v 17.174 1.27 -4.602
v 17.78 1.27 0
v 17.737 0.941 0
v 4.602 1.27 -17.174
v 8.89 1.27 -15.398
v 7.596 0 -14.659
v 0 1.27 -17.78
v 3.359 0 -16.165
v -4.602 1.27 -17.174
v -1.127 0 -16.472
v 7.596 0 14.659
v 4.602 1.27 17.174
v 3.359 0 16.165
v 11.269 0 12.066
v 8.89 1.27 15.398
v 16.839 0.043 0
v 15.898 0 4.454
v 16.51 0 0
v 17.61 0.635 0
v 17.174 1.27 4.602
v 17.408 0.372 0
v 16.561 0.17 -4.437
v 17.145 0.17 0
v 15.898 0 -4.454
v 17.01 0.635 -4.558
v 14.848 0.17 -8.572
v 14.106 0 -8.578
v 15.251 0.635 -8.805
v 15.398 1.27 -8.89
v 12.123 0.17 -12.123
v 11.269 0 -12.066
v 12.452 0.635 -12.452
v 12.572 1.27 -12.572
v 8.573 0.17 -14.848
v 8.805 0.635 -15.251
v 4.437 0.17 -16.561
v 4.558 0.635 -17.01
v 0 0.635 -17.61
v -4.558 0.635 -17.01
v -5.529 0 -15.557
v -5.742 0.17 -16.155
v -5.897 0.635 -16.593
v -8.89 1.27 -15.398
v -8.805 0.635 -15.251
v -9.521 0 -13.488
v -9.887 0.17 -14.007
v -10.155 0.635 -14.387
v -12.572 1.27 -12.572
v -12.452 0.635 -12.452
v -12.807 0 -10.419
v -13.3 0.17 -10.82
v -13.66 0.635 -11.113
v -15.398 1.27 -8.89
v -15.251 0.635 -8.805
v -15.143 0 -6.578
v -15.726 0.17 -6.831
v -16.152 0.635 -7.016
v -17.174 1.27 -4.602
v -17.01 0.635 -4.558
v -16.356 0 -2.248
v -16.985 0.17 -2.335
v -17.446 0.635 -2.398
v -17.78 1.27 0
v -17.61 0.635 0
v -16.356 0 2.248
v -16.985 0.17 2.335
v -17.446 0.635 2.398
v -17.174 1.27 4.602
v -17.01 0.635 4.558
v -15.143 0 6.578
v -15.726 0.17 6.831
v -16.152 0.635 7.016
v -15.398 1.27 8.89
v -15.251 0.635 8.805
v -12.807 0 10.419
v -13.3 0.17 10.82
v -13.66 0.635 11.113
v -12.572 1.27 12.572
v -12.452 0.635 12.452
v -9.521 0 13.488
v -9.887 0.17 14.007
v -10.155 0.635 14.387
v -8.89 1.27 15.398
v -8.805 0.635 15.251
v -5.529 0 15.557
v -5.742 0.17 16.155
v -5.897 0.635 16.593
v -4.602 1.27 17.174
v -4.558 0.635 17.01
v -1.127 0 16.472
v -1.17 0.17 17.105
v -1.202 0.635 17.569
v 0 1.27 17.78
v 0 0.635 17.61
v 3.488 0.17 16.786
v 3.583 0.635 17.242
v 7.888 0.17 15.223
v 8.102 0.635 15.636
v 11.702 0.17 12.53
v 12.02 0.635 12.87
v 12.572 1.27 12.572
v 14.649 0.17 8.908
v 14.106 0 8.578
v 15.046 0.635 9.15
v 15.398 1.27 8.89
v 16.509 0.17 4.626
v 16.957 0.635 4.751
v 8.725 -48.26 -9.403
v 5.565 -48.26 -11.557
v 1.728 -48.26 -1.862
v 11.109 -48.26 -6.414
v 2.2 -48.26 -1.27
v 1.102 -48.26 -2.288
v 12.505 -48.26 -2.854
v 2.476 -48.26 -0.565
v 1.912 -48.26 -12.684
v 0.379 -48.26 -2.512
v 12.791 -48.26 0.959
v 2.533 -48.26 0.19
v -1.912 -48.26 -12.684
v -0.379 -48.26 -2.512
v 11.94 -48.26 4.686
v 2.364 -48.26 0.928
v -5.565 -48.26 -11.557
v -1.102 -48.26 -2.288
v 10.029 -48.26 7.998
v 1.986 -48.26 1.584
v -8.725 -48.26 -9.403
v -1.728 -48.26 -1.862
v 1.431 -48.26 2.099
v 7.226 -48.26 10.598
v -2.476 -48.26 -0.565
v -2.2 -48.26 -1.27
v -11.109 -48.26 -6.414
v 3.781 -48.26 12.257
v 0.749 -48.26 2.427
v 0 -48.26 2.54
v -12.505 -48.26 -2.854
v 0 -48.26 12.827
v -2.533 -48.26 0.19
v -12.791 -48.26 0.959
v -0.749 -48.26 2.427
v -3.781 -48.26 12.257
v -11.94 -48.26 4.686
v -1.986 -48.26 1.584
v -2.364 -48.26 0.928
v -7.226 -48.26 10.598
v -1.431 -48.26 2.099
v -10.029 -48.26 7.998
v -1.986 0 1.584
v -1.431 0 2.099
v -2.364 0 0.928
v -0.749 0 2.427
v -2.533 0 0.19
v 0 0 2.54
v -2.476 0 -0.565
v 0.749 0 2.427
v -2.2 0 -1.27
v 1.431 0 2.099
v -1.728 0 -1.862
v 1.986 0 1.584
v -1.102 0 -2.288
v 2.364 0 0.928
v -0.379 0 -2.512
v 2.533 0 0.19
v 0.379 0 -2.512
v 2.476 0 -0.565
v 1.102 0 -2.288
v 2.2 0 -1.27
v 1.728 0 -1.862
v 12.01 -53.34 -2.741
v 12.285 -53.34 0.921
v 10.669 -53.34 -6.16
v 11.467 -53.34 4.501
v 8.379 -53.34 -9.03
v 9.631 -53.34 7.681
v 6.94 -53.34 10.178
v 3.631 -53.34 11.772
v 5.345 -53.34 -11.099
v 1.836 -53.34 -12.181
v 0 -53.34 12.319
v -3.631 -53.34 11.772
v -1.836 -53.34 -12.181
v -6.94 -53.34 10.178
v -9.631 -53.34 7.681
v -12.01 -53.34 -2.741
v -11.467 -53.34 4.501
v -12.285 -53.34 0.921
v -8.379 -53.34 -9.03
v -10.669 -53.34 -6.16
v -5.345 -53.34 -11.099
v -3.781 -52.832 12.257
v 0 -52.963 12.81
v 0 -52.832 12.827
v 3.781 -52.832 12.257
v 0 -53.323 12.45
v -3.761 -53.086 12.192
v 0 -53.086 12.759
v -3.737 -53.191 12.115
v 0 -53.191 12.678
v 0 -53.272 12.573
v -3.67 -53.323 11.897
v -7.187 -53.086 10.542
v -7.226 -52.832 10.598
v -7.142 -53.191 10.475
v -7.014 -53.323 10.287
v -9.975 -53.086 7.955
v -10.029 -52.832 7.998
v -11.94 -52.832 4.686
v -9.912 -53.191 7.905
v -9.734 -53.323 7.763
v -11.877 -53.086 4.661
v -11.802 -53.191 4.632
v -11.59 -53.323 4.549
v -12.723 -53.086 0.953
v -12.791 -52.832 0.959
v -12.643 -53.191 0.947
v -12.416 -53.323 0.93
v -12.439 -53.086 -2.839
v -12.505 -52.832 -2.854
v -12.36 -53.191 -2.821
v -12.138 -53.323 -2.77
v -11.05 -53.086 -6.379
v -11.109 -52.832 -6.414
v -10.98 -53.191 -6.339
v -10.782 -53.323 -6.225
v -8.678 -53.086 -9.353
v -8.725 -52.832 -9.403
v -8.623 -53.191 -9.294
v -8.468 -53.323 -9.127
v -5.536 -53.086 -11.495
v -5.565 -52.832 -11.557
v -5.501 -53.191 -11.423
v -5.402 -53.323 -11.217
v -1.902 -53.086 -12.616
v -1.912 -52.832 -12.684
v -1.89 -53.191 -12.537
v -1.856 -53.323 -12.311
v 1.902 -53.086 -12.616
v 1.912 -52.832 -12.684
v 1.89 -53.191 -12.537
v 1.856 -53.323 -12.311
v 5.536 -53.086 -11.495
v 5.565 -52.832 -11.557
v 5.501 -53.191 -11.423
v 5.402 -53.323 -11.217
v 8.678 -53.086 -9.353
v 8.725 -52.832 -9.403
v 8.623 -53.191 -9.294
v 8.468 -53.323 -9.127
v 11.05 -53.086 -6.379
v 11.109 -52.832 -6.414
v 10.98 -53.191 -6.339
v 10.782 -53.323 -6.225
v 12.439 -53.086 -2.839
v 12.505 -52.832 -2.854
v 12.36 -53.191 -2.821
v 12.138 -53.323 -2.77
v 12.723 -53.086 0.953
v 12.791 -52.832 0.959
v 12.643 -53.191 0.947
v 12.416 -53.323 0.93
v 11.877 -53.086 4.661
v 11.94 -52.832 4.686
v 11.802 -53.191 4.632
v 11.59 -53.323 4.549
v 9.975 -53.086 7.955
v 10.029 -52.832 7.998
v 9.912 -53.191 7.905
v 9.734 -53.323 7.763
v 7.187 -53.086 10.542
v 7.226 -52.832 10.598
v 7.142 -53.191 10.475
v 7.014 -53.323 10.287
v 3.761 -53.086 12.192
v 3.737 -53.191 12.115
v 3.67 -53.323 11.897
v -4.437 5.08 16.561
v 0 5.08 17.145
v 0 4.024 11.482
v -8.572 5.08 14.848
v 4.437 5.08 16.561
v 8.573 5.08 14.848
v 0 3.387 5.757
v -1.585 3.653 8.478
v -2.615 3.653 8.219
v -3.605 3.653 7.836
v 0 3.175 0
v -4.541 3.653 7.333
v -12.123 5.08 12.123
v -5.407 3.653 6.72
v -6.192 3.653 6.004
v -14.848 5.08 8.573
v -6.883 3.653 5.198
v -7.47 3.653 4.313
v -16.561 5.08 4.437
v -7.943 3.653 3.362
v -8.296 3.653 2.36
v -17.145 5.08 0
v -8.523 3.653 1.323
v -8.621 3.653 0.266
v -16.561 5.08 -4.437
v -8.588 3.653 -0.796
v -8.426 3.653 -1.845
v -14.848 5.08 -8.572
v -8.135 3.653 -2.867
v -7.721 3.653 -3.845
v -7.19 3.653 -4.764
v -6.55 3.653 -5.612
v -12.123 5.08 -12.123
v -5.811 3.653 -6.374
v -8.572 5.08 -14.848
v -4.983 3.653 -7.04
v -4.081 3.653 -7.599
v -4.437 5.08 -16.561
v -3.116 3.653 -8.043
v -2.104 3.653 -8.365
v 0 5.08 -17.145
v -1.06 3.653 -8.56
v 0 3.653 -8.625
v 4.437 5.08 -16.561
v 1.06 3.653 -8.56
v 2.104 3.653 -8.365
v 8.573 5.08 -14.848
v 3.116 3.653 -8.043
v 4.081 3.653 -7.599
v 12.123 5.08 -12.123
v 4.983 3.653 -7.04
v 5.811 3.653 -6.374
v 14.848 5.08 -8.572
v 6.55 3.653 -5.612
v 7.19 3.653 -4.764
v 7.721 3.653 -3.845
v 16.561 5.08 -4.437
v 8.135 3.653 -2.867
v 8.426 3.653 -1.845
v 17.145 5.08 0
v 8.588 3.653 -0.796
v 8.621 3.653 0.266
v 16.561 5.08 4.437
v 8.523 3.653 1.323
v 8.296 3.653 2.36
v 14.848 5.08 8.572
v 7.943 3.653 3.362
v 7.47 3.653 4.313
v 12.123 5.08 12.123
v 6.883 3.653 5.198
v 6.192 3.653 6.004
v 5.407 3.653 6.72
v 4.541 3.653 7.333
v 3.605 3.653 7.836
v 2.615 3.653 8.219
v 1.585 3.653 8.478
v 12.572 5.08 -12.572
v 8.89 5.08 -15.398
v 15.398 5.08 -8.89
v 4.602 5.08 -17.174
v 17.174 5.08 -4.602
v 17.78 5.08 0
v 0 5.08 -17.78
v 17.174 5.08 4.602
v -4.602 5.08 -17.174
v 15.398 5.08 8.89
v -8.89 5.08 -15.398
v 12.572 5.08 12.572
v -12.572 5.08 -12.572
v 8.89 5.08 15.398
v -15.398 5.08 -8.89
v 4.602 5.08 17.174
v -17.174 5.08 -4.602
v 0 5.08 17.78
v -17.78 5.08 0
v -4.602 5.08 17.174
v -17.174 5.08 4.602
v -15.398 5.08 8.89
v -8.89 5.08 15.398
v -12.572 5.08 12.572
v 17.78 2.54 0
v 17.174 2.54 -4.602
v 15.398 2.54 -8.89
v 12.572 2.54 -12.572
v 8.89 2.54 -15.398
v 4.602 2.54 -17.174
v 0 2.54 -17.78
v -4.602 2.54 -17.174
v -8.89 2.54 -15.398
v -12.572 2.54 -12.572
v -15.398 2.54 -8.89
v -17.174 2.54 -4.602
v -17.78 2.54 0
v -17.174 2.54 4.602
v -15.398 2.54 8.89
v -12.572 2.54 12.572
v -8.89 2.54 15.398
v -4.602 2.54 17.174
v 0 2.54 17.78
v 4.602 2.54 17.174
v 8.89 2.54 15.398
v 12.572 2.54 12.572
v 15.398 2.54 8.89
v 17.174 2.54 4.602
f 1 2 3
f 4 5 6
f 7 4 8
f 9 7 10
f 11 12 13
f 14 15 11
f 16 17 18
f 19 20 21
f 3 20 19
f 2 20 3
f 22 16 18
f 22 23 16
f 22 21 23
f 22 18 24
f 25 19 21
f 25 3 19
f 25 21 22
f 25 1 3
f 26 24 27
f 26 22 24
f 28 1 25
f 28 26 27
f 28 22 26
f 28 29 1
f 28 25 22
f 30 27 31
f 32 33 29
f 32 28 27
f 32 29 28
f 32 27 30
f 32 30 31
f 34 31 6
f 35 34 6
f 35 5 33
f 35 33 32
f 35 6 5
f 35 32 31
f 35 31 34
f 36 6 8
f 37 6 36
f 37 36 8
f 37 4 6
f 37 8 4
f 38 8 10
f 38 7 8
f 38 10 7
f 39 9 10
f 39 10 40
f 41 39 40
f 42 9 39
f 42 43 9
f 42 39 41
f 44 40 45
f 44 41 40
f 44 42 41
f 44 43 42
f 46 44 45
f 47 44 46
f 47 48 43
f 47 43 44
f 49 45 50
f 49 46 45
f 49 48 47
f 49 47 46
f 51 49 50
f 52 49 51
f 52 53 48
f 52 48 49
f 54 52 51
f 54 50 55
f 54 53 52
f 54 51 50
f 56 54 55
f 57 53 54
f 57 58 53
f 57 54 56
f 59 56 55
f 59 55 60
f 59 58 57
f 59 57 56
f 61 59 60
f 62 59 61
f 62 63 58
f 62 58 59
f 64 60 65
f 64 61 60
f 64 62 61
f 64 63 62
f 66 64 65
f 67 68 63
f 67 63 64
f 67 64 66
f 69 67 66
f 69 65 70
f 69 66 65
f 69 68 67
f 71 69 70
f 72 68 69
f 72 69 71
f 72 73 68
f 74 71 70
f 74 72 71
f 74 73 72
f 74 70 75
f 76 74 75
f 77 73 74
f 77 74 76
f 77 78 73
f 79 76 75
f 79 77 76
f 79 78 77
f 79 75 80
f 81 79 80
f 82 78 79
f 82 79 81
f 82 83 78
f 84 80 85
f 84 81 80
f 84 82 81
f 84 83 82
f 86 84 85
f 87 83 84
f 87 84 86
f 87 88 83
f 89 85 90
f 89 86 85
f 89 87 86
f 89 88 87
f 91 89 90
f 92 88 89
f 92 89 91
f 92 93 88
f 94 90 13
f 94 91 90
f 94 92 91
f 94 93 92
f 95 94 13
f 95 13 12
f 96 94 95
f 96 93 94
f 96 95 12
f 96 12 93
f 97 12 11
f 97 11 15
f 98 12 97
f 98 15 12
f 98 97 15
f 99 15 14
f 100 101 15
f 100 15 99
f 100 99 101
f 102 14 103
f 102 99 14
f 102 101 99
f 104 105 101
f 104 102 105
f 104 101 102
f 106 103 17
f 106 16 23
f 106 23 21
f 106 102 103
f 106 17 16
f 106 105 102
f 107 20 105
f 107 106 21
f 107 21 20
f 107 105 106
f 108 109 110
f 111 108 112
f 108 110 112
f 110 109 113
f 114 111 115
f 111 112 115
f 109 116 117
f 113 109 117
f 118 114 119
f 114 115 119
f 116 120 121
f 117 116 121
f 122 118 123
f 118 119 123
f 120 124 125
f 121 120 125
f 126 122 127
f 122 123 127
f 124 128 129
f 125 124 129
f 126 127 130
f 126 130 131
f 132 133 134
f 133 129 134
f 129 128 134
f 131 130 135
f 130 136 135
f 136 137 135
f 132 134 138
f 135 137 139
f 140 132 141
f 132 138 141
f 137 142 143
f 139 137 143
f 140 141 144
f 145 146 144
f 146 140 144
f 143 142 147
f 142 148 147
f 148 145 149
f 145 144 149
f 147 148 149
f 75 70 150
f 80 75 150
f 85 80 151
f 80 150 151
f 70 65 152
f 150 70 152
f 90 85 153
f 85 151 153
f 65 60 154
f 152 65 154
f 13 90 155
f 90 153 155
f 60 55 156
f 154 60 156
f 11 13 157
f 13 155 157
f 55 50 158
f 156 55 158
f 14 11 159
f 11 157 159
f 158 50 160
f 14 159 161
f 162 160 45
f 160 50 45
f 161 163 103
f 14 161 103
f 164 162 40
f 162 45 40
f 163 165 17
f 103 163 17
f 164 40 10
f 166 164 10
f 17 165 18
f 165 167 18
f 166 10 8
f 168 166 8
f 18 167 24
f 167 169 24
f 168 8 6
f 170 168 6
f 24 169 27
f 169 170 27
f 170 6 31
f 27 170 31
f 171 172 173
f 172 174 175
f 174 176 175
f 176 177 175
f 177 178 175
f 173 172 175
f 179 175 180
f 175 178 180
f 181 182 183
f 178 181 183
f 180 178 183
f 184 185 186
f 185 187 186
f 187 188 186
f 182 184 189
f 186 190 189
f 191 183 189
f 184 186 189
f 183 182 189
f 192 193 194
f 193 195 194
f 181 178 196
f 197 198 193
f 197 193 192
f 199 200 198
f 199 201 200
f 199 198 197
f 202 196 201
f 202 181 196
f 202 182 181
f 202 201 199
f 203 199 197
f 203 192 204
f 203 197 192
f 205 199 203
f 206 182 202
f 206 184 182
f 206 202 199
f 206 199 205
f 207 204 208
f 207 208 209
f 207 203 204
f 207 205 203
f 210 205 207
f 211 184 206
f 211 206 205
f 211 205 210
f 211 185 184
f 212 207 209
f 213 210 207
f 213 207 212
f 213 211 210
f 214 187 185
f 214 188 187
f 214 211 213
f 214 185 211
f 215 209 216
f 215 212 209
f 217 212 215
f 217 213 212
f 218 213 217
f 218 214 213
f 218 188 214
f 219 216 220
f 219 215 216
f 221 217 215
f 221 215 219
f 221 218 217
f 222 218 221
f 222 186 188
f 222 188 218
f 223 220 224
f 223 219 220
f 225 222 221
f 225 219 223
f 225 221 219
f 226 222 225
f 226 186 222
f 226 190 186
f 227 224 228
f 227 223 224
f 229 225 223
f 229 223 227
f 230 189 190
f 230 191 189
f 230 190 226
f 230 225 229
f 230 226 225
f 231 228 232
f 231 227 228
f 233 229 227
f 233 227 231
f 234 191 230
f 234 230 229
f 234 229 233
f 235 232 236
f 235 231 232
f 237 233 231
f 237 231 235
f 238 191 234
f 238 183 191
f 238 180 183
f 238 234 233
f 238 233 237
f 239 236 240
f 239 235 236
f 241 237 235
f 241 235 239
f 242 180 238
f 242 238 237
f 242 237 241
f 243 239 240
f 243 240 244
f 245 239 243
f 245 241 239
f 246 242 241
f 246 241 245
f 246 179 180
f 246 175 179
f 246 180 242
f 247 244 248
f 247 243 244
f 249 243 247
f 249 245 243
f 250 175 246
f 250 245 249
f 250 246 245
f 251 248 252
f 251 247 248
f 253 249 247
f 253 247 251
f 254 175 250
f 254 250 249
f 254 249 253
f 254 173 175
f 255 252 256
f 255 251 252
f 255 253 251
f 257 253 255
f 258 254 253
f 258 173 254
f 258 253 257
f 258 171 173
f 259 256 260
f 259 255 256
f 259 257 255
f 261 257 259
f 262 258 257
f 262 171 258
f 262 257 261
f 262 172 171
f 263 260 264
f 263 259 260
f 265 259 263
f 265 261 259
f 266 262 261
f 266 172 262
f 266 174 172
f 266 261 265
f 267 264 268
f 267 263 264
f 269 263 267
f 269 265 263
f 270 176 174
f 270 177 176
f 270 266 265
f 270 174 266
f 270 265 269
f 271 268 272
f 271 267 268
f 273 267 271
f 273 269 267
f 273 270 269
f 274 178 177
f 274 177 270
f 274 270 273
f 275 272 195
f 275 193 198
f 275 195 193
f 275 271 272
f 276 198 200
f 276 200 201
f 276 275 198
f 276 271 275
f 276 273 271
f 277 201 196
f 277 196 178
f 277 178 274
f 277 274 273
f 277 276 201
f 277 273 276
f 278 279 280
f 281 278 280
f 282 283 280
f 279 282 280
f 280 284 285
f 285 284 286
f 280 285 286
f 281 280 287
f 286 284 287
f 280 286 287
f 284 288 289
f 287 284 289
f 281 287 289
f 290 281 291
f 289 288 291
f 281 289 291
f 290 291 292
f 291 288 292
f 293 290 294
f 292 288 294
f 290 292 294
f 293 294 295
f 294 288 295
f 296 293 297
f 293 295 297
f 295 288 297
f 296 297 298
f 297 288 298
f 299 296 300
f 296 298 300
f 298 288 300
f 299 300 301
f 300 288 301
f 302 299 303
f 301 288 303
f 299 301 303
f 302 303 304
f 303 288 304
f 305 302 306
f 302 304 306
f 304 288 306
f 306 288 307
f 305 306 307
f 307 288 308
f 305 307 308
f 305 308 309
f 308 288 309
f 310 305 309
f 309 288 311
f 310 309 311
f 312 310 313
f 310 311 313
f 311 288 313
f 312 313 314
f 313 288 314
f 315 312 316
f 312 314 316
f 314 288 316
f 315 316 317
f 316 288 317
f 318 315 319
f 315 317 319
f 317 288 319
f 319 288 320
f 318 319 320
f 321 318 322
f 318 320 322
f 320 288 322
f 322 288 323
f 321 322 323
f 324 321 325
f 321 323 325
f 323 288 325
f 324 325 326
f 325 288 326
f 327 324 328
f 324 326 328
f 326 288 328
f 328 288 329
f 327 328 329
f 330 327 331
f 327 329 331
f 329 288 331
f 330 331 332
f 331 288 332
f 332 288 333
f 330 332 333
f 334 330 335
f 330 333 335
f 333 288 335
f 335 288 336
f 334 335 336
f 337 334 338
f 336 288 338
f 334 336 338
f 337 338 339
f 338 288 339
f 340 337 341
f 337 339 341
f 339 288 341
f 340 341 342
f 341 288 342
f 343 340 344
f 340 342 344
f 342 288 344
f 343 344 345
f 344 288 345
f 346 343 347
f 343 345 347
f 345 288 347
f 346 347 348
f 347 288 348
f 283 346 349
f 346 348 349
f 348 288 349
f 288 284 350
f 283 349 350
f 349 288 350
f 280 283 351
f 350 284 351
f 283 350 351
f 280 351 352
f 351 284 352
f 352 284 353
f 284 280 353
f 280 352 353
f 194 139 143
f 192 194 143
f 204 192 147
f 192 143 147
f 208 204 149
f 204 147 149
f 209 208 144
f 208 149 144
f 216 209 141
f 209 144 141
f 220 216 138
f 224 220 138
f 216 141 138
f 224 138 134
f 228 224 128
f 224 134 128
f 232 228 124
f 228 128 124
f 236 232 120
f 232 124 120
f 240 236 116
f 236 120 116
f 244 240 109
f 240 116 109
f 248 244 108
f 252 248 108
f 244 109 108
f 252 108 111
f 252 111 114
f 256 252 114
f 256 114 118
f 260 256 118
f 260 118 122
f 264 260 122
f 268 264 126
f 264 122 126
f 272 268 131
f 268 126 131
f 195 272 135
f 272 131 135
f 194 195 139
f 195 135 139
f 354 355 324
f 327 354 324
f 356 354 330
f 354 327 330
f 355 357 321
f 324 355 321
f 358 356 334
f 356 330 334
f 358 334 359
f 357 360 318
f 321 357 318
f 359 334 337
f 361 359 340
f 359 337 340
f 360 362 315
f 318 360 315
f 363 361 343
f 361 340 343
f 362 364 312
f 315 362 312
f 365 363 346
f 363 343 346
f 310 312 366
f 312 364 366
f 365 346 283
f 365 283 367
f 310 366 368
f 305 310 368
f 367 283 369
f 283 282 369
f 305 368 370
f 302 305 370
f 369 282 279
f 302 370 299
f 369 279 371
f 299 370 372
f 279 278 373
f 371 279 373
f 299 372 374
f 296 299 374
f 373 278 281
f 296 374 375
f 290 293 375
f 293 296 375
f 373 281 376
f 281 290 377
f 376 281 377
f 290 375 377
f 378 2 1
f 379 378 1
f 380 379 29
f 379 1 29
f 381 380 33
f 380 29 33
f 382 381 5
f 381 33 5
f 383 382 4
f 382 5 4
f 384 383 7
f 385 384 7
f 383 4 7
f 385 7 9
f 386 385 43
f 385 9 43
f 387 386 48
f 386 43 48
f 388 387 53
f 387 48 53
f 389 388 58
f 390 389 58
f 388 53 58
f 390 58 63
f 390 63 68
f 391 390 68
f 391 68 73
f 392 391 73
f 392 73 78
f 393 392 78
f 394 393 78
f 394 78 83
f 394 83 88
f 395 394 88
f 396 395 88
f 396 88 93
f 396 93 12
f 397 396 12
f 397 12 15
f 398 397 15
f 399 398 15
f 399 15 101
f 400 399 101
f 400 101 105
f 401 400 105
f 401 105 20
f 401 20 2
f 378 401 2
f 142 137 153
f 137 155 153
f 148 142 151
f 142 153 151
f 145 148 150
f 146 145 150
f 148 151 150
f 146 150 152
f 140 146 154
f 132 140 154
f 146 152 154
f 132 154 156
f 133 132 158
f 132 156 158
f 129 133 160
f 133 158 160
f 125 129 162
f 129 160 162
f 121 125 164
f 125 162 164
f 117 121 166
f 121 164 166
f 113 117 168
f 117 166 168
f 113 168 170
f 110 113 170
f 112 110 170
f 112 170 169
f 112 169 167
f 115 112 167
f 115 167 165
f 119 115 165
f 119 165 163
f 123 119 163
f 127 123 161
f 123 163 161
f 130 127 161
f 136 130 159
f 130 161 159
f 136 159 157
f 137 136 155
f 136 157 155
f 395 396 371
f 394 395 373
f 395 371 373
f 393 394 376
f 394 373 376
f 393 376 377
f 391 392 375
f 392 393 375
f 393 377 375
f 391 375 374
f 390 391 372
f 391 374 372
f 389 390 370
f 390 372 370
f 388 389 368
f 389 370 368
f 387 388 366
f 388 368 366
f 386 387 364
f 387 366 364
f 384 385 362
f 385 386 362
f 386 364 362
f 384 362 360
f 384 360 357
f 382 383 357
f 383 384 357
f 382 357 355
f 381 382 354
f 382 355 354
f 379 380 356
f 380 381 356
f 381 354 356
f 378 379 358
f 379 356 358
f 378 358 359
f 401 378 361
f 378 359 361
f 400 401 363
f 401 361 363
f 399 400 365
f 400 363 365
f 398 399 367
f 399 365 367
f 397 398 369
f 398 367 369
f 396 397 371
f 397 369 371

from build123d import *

# Parameters (mm, degrees)
SKETCH1_R           = 17.78
BOSS_EXTRUDE1_DEPTH = 2.54
FILLET1_R           = 0.508
FILLET2_R           = 1.27


with BuildPart() as part:
    # Sketch1 → Boss-Extrude1 (new body)
    with BuildSketch(Plane(origin=(0, 0, 0), x_dir=(1, 0, 0), z_dir=(0, 1, 0))):
        Circle(SKETCH1_R)
    extrude(amount=BOSS_EXTRUDE1_DEPTH)

    # Sketch2 → Revolve1 (revolve)
    with BuildSketch(Plane(origin=(0, 0, 0), x_dir=(0, 0, -1), z_dir=(1, 0, 0))):
        with BuildLine():
            Line((-17.78, 2.54), (-17.78, 5.08))
            Line((-17.78, 5.08), (-17.145, 5.08))
            ThreePointArc((-17.145, 5.08), (-8.625254344, 3.652710903), (0, 3.175))
            Line((0, 3.175), (0, 2.54))
            Line((0, 2.54), (-17.78, 2.54))
        make_face()
        Polygon((0, 0), (0, -53.34), (-12.827, -53.34), (-12.827, -48.26), (-2.54, -48.26), (-2.54, 0), align=None)
    revolve(axis=Axis((0, 0, 0), (0, -1, 0)))

    # Fillet1
    fillet1_edges = [part.edges().sort_by_distance(p)[0] for p in [
        (0, -53.34, -12.827),
    ]]
    fillet(fillet1_edges, radius=FILLET1_R)

    # Fillet2
    fillet2_edges = [part.edges().sort_by_distance(p)[0] for p in [
        (-17.78, 0, 0),
    ]]
    fillet(fillet2_edges, radius=FILLET2_R)


solid = part.part
